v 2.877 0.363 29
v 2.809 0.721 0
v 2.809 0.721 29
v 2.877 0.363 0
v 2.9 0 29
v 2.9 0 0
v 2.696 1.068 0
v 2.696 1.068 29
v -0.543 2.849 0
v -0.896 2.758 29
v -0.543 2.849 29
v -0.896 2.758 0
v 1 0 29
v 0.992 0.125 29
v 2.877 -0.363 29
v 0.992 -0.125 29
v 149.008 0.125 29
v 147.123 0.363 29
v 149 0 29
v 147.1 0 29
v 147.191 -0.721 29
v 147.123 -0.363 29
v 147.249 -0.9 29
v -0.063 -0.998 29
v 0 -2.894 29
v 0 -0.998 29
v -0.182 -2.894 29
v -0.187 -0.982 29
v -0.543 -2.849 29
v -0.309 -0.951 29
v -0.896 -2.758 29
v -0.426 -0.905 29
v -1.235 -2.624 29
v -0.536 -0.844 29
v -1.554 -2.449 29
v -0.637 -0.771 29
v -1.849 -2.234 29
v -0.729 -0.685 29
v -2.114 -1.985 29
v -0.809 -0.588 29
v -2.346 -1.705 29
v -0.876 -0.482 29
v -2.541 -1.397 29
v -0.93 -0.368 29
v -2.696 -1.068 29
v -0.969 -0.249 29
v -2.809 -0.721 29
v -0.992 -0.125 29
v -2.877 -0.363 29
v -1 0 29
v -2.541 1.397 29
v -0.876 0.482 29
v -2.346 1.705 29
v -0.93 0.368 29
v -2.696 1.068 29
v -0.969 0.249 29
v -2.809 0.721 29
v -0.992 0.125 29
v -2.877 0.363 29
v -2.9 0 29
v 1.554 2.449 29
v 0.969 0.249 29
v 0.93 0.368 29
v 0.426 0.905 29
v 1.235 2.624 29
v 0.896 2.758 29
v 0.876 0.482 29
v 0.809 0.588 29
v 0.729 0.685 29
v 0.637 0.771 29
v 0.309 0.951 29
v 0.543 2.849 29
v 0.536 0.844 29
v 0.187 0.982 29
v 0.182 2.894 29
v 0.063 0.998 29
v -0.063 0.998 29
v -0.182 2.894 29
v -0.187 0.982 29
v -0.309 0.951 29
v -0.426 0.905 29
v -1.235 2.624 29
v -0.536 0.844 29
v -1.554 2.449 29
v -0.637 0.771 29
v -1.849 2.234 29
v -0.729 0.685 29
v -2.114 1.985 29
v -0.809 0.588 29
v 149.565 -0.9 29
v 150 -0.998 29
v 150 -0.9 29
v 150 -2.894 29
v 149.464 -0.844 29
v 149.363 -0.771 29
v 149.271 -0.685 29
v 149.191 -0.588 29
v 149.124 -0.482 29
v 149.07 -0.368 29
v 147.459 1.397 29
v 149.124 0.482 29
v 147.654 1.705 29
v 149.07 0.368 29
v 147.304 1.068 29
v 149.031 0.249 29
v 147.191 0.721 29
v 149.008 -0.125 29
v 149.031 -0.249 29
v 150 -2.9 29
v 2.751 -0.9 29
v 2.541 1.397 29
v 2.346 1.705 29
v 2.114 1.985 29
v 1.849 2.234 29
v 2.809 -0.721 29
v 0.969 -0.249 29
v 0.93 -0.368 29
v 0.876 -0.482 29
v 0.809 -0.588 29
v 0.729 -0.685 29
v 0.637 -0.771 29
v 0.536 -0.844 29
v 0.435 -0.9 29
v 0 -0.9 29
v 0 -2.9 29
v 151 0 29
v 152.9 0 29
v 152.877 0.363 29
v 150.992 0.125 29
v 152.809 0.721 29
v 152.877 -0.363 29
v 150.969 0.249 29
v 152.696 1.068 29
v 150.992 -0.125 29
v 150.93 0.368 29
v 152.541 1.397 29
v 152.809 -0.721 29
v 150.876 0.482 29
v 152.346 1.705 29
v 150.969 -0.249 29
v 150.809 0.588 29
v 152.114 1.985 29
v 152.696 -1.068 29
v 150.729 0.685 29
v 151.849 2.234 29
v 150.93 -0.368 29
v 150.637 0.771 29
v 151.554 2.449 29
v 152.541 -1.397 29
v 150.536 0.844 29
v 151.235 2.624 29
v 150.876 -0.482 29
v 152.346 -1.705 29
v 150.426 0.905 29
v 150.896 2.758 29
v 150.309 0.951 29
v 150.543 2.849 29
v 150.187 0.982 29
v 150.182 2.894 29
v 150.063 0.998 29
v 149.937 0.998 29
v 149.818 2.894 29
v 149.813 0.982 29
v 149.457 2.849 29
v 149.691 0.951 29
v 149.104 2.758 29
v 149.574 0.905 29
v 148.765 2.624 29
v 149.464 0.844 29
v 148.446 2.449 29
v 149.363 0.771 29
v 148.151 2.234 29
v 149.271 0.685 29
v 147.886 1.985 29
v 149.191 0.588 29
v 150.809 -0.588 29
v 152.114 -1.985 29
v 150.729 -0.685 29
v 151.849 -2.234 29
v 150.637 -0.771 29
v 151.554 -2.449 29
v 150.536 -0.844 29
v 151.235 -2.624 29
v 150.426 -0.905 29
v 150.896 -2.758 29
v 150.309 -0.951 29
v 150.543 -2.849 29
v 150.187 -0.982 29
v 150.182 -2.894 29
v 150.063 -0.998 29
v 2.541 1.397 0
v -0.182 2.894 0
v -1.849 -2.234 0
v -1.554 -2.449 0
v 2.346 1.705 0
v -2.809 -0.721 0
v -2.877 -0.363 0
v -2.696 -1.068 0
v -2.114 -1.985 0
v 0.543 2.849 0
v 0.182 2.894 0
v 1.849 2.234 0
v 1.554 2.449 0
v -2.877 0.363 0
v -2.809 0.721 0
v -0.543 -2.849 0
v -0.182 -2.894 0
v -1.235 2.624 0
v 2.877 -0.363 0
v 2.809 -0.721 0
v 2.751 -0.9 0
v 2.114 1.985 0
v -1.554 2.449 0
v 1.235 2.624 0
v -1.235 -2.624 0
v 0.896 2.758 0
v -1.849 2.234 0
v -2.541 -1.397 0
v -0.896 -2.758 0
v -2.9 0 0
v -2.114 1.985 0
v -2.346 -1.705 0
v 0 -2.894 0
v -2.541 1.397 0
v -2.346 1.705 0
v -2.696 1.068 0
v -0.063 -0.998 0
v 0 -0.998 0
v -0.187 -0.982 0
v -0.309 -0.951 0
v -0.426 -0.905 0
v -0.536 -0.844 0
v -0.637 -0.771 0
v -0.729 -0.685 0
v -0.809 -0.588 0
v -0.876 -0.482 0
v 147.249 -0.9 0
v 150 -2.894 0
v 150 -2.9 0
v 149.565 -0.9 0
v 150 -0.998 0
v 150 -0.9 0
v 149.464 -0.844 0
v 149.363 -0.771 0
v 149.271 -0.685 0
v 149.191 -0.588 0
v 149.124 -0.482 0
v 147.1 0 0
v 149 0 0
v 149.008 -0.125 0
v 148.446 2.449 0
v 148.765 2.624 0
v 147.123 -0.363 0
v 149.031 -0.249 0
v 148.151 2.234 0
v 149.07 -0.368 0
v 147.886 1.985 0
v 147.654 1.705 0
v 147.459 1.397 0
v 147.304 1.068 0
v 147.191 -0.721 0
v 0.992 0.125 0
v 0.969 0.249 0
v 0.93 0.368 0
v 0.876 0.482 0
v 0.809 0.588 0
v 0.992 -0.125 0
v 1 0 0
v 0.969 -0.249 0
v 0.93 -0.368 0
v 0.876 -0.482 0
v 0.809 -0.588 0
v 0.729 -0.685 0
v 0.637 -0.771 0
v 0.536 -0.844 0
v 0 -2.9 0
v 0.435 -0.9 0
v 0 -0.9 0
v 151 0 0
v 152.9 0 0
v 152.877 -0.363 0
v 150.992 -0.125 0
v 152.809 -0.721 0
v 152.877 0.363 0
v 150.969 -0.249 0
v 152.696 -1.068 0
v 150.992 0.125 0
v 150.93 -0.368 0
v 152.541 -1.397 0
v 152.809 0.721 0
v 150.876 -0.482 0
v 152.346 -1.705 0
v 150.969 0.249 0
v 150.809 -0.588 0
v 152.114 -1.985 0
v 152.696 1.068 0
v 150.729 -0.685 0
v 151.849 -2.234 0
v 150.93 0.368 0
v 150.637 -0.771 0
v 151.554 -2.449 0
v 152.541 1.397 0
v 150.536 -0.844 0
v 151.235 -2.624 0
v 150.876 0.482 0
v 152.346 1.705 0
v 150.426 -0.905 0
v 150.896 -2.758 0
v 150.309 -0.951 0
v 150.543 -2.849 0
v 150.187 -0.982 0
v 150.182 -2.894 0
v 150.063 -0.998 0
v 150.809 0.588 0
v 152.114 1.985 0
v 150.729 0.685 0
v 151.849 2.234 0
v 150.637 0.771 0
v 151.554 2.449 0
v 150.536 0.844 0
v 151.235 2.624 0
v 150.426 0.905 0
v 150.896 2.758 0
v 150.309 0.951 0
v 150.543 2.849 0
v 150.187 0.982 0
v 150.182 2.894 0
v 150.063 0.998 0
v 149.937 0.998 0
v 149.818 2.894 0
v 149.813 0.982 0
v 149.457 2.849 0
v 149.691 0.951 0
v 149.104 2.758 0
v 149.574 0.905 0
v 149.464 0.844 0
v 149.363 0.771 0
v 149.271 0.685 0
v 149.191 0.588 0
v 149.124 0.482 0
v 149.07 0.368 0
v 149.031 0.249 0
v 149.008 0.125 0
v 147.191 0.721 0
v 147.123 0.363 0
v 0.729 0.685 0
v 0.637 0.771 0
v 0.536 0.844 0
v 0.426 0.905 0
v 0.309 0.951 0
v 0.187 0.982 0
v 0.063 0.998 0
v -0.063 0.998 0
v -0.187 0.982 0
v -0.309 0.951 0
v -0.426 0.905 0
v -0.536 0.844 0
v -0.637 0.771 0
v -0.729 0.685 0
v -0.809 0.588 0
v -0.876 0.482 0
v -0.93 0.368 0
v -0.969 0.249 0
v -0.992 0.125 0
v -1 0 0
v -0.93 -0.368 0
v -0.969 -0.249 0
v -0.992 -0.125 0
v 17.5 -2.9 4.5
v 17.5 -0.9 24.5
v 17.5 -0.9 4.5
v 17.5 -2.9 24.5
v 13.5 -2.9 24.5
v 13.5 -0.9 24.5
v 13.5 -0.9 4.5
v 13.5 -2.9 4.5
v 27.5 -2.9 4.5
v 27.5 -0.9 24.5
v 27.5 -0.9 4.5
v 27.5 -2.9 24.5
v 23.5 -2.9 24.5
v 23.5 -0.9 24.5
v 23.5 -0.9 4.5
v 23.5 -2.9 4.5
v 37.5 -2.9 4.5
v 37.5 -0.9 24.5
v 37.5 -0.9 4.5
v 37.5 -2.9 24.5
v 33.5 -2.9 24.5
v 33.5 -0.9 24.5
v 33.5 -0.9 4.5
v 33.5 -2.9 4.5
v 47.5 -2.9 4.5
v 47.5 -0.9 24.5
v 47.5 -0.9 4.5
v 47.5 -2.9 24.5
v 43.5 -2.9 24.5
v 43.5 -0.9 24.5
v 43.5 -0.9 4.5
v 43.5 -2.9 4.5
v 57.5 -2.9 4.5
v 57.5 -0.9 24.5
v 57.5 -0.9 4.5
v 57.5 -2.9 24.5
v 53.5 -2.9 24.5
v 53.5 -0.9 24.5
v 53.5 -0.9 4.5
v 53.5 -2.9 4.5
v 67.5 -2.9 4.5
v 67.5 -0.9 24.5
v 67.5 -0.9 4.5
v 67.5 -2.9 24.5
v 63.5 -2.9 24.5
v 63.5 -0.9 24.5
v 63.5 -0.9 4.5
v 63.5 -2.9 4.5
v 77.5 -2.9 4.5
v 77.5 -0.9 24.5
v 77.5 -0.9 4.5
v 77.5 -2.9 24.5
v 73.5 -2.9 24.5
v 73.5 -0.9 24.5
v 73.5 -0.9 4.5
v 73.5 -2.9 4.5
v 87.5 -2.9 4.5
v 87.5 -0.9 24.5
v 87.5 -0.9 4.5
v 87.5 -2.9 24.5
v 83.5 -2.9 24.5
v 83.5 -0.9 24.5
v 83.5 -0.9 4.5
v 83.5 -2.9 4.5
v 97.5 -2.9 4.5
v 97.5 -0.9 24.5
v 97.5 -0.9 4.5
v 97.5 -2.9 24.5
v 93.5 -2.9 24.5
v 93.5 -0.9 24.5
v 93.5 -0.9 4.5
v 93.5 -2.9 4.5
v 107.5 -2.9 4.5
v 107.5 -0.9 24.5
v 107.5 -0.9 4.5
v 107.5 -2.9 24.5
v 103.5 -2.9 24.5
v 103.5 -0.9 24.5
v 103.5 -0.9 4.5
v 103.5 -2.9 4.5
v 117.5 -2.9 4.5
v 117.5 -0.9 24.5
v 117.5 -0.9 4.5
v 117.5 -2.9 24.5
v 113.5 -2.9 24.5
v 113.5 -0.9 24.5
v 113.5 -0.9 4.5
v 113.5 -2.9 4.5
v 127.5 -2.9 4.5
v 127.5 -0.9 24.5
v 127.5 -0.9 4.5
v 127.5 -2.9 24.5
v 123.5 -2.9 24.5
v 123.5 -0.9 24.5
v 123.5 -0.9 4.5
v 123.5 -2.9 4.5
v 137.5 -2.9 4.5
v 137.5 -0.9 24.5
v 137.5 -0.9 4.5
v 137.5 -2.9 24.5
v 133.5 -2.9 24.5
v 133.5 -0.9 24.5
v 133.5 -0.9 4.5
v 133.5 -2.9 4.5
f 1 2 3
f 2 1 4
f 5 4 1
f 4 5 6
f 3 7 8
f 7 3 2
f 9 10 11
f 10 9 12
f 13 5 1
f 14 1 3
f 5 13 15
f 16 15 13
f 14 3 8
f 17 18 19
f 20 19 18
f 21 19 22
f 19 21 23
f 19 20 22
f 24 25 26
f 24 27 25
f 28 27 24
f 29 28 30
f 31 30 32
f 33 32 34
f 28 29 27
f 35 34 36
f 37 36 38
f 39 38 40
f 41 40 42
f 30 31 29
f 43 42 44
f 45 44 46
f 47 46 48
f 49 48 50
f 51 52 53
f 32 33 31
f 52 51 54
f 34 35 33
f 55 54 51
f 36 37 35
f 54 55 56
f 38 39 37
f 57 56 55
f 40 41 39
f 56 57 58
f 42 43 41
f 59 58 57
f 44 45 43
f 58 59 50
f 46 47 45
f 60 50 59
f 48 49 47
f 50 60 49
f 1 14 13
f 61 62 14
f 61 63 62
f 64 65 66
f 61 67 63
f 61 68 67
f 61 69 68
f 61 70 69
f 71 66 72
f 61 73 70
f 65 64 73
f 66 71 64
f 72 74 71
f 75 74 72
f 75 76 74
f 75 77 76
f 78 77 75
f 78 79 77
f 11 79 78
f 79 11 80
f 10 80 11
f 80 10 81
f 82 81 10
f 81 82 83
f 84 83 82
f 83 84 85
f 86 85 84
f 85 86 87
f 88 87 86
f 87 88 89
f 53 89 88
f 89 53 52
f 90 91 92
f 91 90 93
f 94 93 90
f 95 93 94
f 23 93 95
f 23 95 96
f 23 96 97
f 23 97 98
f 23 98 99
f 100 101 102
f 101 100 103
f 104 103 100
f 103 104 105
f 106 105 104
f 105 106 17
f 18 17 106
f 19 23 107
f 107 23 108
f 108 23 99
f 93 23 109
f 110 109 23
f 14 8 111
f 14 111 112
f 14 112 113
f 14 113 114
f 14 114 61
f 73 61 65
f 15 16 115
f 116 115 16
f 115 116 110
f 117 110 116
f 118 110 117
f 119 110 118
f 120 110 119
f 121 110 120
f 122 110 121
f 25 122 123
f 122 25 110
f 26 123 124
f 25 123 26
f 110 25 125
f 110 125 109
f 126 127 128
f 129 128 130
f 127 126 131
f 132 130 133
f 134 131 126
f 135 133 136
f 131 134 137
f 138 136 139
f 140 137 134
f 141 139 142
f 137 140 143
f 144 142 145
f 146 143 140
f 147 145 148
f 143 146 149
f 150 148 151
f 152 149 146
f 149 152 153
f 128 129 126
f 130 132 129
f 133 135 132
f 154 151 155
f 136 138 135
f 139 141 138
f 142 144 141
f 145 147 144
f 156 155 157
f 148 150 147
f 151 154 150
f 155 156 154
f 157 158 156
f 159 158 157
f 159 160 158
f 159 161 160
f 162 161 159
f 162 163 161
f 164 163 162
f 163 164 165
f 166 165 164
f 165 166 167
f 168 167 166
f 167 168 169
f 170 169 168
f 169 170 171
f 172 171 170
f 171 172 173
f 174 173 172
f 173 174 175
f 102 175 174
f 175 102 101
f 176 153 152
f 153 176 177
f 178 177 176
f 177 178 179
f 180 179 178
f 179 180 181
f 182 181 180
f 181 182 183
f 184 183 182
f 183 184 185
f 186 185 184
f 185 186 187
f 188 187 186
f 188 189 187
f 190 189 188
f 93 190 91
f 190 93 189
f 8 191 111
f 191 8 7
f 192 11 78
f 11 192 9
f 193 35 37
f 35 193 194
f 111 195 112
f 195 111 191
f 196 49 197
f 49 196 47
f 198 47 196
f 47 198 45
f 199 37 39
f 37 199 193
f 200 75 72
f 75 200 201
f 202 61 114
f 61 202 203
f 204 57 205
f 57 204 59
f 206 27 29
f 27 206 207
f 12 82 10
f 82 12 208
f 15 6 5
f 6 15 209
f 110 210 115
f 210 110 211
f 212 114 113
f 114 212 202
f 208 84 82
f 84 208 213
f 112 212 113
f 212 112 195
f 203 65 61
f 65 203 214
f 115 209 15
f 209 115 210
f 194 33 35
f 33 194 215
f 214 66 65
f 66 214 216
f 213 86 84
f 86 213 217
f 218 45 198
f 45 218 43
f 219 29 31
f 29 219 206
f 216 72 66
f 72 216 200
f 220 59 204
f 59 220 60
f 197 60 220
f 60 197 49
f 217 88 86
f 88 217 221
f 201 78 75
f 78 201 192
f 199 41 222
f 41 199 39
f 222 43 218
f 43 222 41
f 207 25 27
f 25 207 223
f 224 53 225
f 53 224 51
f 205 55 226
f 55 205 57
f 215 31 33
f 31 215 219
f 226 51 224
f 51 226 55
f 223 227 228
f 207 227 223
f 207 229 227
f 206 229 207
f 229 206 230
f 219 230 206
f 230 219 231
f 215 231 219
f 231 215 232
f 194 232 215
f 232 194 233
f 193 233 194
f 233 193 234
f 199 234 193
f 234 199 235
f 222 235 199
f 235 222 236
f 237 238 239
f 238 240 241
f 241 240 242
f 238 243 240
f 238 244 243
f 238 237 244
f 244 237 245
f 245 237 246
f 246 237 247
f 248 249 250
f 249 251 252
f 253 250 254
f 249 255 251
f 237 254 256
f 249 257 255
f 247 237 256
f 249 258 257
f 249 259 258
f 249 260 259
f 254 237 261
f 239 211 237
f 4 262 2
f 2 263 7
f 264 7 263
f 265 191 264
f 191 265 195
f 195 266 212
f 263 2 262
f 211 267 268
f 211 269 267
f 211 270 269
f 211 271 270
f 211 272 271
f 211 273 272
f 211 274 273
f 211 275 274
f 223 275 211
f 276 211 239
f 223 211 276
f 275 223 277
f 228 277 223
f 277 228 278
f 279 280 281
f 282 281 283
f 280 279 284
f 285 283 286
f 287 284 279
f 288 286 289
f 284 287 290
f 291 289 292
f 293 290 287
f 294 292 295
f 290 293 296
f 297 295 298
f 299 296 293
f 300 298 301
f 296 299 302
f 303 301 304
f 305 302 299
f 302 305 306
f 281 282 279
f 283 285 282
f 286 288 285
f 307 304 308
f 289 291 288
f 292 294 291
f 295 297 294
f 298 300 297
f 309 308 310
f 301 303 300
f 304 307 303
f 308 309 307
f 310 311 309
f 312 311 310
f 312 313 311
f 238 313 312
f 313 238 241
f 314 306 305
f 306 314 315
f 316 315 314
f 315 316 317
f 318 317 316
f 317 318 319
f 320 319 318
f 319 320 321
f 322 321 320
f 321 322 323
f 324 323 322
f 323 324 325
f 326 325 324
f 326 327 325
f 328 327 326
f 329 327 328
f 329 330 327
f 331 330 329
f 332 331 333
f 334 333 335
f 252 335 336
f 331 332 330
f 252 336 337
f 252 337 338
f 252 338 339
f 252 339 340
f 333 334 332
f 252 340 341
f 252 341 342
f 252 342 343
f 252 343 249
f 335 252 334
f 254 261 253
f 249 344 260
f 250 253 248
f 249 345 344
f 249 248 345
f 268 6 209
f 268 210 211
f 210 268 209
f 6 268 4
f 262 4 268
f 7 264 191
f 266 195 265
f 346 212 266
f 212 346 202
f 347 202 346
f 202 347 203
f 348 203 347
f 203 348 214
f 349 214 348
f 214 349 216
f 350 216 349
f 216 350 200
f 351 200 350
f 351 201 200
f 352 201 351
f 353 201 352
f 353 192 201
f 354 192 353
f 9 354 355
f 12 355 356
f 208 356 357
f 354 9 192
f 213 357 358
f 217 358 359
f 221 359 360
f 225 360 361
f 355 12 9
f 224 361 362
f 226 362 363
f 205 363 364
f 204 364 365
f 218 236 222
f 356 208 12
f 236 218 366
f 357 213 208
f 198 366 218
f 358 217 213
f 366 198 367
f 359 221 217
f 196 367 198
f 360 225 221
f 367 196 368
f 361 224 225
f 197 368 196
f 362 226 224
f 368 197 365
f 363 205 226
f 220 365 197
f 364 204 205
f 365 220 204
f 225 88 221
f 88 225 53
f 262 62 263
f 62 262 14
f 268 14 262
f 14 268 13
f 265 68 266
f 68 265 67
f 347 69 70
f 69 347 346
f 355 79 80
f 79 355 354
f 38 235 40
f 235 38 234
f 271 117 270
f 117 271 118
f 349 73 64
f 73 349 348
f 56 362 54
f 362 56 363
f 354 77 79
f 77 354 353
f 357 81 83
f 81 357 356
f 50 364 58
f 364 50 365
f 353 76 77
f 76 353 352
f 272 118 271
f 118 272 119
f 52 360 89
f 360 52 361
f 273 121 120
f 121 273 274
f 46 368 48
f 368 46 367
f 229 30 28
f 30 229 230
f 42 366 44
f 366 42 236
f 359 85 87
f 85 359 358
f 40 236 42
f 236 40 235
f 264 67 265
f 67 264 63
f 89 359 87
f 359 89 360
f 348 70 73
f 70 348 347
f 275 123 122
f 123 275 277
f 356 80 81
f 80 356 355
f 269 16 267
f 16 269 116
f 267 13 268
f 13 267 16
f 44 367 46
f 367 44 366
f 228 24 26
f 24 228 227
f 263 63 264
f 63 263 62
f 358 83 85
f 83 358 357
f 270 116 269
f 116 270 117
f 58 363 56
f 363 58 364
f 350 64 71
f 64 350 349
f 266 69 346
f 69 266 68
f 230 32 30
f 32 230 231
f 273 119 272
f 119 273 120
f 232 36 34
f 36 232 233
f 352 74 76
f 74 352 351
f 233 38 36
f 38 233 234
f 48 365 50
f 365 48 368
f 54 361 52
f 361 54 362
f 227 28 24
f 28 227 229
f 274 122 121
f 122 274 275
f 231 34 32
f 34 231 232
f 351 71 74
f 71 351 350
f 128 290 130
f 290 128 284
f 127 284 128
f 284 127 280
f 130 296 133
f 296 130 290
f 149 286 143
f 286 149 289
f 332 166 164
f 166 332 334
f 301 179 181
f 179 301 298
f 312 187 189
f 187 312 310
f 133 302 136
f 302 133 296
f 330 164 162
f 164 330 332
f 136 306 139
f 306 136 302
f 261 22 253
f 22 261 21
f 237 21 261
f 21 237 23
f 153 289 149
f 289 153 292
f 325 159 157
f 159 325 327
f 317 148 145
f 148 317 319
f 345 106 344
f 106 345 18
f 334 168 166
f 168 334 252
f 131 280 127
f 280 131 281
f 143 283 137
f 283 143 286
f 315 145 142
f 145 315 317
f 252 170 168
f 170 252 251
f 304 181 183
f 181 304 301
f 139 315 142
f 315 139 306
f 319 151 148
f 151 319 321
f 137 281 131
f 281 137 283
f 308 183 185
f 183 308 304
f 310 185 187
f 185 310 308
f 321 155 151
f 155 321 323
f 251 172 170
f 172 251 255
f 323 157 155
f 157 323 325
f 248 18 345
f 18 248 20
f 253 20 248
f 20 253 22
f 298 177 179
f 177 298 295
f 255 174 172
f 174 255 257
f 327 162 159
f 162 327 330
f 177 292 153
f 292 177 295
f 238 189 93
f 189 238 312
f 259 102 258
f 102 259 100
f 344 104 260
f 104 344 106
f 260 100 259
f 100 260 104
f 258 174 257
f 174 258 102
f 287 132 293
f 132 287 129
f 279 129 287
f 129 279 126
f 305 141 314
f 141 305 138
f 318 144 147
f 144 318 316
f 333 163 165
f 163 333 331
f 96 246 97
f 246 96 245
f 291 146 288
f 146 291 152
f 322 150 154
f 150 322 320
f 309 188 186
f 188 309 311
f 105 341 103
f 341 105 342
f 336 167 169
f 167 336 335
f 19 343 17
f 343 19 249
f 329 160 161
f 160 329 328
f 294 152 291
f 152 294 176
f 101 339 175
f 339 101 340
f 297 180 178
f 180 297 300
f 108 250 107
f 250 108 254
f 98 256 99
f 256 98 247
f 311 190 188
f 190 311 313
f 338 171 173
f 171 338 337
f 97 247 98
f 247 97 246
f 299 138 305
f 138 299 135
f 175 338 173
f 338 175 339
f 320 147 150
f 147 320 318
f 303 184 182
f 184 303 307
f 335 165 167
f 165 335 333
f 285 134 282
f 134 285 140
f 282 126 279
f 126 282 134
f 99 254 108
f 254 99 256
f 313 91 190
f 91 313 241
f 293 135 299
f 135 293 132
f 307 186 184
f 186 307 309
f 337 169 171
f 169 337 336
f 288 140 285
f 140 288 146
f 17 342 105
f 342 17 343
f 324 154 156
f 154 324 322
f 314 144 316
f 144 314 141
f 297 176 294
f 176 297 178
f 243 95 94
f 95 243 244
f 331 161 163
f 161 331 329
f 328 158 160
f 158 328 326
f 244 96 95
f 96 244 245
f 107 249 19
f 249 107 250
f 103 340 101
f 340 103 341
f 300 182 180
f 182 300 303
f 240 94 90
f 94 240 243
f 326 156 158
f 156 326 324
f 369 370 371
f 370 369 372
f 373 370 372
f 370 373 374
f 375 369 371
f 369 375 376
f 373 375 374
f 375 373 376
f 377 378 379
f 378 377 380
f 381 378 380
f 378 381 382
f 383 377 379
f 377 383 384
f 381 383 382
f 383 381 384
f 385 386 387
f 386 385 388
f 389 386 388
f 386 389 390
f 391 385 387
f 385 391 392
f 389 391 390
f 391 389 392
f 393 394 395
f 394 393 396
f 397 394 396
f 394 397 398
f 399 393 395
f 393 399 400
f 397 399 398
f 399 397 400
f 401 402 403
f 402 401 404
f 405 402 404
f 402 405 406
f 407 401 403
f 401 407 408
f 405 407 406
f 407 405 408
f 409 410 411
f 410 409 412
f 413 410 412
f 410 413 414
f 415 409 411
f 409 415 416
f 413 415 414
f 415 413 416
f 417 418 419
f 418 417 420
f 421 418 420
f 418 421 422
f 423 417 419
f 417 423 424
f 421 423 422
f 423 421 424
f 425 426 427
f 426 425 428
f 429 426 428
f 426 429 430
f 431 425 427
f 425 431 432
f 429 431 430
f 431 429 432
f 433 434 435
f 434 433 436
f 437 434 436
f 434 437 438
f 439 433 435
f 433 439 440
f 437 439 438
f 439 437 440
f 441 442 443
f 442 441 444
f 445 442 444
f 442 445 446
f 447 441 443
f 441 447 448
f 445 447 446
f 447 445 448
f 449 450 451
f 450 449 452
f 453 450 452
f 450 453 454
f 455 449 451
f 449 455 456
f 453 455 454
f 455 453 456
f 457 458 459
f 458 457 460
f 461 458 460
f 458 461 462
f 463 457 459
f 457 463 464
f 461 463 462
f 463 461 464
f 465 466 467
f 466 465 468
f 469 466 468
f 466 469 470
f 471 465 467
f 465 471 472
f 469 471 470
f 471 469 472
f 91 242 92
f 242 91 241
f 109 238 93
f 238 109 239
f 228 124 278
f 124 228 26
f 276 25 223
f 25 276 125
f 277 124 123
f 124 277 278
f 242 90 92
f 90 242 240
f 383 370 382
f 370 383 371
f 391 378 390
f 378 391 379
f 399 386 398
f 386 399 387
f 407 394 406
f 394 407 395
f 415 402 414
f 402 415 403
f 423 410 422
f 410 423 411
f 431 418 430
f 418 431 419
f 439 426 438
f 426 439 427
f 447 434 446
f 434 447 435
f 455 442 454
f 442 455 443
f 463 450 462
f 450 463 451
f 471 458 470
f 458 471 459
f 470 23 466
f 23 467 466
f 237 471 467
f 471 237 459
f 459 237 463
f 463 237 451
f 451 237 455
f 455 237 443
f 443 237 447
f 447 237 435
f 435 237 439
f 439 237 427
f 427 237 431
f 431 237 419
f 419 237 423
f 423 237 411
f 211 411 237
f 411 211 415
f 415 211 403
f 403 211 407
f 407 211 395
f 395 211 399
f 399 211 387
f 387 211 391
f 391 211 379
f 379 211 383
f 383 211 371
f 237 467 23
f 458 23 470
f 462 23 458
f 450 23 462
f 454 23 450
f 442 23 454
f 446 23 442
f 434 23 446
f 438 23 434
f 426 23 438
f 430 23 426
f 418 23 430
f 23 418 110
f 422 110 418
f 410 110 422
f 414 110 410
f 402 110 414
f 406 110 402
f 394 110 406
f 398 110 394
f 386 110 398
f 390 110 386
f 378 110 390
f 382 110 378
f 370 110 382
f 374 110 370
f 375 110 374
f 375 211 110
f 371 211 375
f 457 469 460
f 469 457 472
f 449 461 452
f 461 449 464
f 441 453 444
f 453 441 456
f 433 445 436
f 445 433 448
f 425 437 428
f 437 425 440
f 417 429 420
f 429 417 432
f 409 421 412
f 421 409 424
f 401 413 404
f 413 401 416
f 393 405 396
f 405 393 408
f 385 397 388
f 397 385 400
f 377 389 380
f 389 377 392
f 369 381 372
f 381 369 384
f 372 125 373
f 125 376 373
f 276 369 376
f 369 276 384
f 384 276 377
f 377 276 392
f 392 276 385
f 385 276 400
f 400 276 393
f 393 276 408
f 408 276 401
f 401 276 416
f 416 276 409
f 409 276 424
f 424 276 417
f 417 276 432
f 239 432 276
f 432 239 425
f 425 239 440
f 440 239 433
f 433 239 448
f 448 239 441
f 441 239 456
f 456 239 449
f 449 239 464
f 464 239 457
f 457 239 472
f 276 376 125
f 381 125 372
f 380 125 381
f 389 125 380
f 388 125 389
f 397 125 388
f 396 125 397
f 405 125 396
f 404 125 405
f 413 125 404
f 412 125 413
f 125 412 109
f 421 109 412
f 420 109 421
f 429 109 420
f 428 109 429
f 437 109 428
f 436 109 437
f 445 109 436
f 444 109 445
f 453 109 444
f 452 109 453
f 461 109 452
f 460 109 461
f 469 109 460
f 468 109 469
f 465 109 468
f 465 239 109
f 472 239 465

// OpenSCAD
/******************************************************
*  A flexible bracelet with the customizable length   *
*  for the "Ultrasound-sensing based navigational     *
*  support for visually impaired"                     *
*  https://www.thingiverse.com/thing:3717730          *
*                                                     *
*  Instructions:
*  https://www.appropedia.org/Low-cost_open_source_ultrasound-sensing_based_navigational_support_for_visually_impaired
*                                                     *
*                                                     *
*  Aliaksei Petsiuk, 2019                             *
*  Licence: CC BY-SA 3.0                              *
*                                                     *
*******************************************************/

$fn = 50;  // resolution
len = 150; // variable length

// round fixator #1
difference(){
    cylinder(  29, d=5.8, center=false);
    cylinder(h=30, d1=2, d2=2, center=false);
}

// round fixator #2
translate([len, 0, 0])
difference(){
    cylinder(  29, d=5.8, center=false);
    cylinder(h=30, d1=2, d2=2, center=false);
}

// bracelet
difference(){
translate([0, -2.9, 0])
cube([len,2,29],false);

// perforation pattern
for(i=[0:len/10-3])
    translate([i*10+13.5,-4,4.5])
       cube([4,5,20],false);
}

// end
